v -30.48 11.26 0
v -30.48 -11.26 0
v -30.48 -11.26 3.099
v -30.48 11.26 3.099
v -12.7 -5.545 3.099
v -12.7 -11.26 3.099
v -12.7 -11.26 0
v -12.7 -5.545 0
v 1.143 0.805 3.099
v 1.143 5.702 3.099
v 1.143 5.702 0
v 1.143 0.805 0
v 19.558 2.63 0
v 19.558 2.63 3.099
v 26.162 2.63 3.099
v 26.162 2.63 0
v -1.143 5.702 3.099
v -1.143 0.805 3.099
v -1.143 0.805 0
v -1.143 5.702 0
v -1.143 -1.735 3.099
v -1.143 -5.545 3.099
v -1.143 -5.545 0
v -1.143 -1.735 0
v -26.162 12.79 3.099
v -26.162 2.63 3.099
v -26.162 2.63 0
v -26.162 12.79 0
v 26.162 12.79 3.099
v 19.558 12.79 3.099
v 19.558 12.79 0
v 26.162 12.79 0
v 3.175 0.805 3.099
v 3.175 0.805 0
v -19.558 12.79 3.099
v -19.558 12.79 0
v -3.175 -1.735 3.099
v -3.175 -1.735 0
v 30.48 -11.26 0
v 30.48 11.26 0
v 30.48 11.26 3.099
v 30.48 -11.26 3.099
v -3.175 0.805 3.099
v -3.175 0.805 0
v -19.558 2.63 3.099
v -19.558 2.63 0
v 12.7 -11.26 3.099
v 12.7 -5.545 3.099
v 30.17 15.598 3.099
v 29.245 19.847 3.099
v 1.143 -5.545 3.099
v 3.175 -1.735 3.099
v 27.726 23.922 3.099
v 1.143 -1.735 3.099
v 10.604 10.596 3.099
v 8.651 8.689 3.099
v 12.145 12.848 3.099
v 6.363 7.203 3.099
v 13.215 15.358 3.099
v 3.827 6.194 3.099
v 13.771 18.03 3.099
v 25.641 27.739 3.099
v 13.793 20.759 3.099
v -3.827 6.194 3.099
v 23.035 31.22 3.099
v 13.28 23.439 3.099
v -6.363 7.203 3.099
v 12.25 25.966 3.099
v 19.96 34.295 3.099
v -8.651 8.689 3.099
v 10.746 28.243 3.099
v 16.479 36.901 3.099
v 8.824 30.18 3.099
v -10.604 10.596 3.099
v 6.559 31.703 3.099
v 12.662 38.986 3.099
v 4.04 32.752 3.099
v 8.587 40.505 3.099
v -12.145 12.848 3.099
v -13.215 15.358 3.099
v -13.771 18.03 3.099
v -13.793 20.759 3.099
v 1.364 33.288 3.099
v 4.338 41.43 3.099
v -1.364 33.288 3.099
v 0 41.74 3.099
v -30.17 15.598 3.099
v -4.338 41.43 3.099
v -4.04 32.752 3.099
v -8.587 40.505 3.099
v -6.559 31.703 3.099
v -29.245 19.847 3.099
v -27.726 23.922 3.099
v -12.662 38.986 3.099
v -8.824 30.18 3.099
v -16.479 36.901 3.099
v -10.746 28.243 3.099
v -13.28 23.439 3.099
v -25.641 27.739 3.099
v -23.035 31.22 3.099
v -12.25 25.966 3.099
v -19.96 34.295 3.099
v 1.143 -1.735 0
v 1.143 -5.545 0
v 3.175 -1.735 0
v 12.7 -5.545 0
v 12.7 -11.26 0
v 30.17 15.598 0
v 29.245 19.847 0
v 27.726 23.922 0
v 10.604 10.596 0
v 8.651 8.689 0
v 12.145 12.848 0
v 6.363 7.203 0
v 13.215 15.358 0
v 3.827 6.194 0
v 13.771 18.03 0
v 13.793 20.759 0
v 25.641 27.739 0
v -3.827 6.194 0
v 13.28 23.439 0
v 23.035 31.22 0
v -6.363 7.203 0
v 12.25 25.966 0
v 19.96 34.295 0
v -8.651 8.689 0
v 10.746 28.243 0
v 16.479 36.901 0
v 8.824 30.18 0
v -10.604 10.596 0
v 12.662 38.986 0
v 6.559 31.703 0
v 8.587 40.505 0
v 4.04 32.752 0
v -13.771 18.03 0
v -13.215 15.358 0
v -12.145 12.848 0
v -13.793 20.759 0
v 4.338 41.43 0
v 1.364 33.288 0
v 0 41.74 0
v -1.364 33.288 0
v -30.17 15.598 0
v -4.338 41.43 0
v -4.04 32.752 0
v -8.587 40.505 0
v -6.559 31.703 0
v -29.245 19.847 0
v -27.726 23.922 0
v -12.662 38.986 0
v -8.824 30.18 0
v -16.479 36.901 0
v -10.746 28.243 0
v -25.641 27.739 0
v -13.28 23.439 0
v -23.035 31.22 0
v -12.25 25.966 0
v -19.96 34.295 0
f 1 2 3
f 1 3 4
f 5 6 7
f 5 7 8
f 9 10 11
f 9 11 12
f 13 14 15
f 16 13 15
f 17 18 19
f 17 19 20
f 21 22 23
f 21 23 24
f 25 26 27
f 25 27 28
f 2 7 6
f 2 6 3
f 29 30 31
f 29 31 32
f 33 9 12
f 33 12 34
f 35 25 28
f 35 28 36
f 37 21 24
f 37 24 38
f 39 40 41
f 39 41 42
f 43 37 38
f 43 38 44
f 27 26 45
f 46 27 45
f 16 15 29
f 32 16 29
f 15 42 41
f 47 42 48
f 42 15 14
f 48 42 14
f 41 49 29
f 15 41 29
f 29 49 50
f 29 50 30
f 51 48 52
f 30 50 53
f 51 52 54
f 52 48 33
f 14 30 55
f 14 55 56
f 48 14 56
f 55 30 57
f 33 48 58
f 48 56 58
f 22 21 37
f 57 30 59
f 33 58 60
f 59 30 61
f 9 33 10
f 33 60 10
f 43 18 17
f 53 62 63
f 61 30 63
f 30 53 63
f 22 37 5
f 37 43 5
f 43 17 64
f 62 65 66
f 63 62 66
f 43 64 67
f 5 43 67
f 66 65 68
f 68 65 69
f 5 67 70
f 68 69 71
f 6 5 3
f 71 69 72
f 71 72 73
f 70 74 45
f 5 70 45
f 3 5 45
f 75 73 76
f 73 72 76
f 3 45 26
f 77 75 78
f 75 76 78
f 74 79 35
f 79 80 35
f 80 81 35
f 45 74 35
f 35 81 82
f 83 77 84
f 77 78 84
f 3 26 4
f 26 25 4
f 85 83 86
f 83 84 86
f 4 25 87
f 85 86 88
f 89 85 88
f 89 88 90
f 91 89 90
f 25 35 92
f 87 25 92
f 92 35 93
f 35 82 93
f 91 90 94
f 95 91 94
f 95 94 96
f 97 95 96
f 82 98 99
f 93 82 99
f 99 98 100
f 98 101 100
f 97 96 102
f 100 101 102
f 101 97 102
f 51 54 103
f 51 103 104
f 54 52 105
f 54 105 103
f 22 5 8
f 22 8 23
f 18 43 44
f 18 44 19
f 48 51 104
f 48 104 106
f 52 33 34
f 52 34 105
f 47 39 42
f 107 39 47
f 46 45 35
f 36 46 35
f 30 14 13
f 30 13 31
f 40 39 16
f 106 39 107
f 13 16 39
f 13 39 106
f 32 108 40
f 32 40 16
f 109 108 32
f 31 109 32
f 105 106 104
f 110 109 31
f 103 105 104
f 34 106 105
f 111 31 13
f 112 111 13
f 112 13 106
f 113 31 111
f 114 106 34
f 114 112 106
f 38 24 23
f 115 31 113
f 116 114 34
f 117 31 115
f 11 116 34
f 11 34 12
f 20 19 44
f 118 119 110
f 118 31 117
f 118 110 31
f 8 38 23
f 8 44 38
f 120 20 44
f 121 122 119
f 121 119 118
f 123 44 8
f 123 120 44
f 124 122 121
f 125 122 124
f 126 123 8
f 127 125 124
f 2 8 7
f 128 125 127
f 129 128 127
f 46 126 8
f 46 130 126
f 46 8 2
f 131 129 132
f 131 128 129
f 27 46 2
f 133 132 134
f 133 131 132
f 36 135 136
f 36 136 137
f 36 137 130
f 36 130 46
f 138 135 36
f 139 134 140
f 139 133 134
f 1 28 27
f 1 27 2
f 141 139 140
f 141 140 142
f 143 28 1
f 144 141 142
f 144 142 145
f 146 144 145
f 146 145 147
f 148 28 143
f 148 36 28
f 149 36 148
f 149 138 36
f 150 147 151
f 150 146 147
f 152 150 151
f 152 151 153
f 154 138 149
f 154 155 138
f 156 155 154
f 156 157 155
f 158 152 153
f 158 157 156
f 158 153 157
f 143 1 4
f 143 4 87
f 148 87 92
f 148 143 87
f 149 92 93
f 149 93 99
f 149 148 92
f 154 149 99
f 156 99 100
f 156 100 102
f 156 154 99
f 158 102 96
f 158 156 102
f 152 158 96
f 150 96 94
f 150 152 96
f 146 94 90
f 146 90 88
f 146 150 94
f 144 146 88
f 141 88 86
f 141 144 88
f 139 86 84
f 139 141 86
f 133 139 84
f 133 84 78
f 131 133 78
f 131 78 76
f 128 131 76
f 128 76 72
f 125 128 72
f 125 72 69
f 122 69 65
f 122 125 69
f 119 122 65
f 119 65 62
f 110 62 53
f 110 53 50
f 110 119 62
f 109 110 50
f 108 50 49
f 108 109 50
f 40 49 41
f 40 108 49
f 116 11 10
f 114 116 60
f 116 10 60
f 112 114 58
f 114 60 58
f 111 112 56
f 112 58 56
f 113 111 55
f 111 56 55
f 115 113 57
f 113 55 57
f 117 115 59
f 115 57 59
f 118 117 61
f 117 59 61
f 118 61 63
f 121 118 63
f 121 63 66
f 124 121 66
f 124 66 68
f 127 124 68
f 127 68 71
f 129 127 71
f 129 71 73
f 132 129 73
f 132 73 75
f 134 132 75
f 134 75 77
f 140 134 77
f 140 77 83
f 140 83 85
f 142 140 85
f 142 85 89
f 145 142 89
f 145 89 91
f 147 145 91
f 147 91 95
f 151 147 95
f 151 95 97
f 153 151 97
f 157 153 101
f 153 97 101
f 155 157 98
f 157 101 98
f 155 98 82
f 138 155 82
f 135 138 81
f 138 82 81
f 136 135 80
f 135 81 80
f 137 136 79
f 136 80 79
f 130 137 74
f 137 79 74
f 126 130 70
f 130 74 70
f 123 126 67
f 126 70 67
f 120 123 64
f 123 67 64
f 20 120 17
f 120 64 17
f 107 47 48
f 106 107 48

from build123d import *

# Parameters (mm, degrees)
BOSS_EXTRUDE1_DEPTH = 3.0988
CUT_EXTRUDE1_REACH  = 53.777
SKETCH2_R           = 13.85
CUT_EXTRUDE2_REACH  = 53.777
SKETCH3_W           = 25.4
SKETCH3_H           = 5.715
CUT_EXTRUDE4_REACH  = 53.777
CUT_EXTRUDE5_REACH  = 53.777
SKETCH6_W           = 6.604
SKETCH6_H           = 10.16


with BuildPart() as part:
    # Sketch1 → Boss-Extrude1 (new body)
    with BuildSketch(Plane.XY):
        with BuildLine():
            Line((30.48, -11.260079969), (-30.48, -11.260079969))
            Line((-30.48, -11.260079969), (-30.48, 11.260079969))
            ThreePointArc((-30.48, 11.260079969), (0, 41.740079969), (30.48, 11.260079969))
            Line((30.48, 11.260079969), (30.48, -11.260079969))
        make_face()
    extrude(amount=BOSS_EXTRUDE1_DEPTH)

    # Sketch2 → Cut-Extrude1 (cut, up to next)
    with BuildSketch(Plane.XY.offset(3.0988), mode=Mode.PRIVATE) as cut_extrude1_sk1:
        with Locations((0, 19.504919969)):
            Circle(SKETCH2_R)
    cut_extrude1_tool1 = extrude(cut_extrude1_sk1.sketch, amount=-CUT_EXTRUDE1_REACH, mode=Mode.PRIVATE) & part.part
    add(cut_extrude1_tool1.solids().sort_by_distance((0, 19.50492, 3.0988))[0], mode=Mode.SUBTRACT)

    # Sketch3 → Cut-Extrude2 (cut, up to next)
    with BuildSketch(Plane.XY.offset(3.0988), mode=Mode.PRIVATE) as cut_extrude2_sk1:
        with Locations((0, -8.402579969)):
            Rectangle(SKETCH3_W, SKETCH3_H)
    cut_extrude2_tool1 = extrude(cut_extrude2_sk1.sketch, amount=-CUT_EXTRUDE2_REACH, mode=Mode.PRIVATE) & part.part
    add(cut_extrude2_tool1.solids().sort_by_distance((0, -8.40258, 3.0988))[0], mode=Mode.SUBTRACT)

    # Sketch5 → Cut-Extrude4 (cut, up to next)
    with BuildSketch(Plane.XY.offset(3.0988), mode=Mode.PRIVATE) as cut_extrude4_sk1:
        Polygon((3.175, -1.735079969), (1.143, -1.735079969), (1.143, -5.545079969), (-1.143, -5.545079969), (-1.143, -1.735079969), (-3.175, -1.735079969), (-3.175, 0.804920031), (-1.143, 0.804920031), (-1.143, 8.424920031), (1.143, 8.424920031), (1.143, 0.804920031), (3.175, 0.804920031), align=None)
    cut_extrude4_tool1 = extrude(cut_extrude4_sk1.sketch, amount=-CUT_EXTRUDE4_REACH, mode=Mode.PRIVATE) & part.part
    add(cut_extrude4_tool1.solids().sort_by_distance((0, 0.974577, 3.0988))[0], mode=Mode.SUBTRACT)

    # Sketch6 → Cut-Extrude5 (cut, up to next)
    with BuildSketch(Plane.XY.offset(3.0988), mode=Mode.PRIVATE) as cut_extrude5_sk1:
        with Locations((22.86, 7.710464847)):
            Rectangle(SKETCH6_W, SKETCH6_H)
    cut_extrude5_tool1 = extrude(cut_extrude5_sk1.sketch, amount=-CUT_EXTRUDE5_REACH, mode=Mode.PRIVATE) & part.part
    # Sketch6 → Cut-Extrude5 (cut, up to next)
    with BuildSketch(Plane.XY.offset(3.0988), mode=Mode.PRIVATE) as cut_extrude5_sk2:
        with Locations((-22.86, 7.710464847)):
            Rectangle(SKETCH6_W, SKETCH6_H)
    cut_extrude5_tool2 = extrude(cut_extrude5_sk2.sketch, amount=-CUT_EXTRUDE5_REACH, mode=Mode.PRIVATE) & part.part
    add(cut_extrude5_tool1.solids().sort_by_distance((22.86, 7.710465, 3.0988))[0], mode=Mode.SUBTRACT)
    add(cut_extrude5_tool2.solids().sort_by_distance((-22.86, 7.710465, 3.0988))[0], mode=Mode.SUBTRACT)


solid = part.part
